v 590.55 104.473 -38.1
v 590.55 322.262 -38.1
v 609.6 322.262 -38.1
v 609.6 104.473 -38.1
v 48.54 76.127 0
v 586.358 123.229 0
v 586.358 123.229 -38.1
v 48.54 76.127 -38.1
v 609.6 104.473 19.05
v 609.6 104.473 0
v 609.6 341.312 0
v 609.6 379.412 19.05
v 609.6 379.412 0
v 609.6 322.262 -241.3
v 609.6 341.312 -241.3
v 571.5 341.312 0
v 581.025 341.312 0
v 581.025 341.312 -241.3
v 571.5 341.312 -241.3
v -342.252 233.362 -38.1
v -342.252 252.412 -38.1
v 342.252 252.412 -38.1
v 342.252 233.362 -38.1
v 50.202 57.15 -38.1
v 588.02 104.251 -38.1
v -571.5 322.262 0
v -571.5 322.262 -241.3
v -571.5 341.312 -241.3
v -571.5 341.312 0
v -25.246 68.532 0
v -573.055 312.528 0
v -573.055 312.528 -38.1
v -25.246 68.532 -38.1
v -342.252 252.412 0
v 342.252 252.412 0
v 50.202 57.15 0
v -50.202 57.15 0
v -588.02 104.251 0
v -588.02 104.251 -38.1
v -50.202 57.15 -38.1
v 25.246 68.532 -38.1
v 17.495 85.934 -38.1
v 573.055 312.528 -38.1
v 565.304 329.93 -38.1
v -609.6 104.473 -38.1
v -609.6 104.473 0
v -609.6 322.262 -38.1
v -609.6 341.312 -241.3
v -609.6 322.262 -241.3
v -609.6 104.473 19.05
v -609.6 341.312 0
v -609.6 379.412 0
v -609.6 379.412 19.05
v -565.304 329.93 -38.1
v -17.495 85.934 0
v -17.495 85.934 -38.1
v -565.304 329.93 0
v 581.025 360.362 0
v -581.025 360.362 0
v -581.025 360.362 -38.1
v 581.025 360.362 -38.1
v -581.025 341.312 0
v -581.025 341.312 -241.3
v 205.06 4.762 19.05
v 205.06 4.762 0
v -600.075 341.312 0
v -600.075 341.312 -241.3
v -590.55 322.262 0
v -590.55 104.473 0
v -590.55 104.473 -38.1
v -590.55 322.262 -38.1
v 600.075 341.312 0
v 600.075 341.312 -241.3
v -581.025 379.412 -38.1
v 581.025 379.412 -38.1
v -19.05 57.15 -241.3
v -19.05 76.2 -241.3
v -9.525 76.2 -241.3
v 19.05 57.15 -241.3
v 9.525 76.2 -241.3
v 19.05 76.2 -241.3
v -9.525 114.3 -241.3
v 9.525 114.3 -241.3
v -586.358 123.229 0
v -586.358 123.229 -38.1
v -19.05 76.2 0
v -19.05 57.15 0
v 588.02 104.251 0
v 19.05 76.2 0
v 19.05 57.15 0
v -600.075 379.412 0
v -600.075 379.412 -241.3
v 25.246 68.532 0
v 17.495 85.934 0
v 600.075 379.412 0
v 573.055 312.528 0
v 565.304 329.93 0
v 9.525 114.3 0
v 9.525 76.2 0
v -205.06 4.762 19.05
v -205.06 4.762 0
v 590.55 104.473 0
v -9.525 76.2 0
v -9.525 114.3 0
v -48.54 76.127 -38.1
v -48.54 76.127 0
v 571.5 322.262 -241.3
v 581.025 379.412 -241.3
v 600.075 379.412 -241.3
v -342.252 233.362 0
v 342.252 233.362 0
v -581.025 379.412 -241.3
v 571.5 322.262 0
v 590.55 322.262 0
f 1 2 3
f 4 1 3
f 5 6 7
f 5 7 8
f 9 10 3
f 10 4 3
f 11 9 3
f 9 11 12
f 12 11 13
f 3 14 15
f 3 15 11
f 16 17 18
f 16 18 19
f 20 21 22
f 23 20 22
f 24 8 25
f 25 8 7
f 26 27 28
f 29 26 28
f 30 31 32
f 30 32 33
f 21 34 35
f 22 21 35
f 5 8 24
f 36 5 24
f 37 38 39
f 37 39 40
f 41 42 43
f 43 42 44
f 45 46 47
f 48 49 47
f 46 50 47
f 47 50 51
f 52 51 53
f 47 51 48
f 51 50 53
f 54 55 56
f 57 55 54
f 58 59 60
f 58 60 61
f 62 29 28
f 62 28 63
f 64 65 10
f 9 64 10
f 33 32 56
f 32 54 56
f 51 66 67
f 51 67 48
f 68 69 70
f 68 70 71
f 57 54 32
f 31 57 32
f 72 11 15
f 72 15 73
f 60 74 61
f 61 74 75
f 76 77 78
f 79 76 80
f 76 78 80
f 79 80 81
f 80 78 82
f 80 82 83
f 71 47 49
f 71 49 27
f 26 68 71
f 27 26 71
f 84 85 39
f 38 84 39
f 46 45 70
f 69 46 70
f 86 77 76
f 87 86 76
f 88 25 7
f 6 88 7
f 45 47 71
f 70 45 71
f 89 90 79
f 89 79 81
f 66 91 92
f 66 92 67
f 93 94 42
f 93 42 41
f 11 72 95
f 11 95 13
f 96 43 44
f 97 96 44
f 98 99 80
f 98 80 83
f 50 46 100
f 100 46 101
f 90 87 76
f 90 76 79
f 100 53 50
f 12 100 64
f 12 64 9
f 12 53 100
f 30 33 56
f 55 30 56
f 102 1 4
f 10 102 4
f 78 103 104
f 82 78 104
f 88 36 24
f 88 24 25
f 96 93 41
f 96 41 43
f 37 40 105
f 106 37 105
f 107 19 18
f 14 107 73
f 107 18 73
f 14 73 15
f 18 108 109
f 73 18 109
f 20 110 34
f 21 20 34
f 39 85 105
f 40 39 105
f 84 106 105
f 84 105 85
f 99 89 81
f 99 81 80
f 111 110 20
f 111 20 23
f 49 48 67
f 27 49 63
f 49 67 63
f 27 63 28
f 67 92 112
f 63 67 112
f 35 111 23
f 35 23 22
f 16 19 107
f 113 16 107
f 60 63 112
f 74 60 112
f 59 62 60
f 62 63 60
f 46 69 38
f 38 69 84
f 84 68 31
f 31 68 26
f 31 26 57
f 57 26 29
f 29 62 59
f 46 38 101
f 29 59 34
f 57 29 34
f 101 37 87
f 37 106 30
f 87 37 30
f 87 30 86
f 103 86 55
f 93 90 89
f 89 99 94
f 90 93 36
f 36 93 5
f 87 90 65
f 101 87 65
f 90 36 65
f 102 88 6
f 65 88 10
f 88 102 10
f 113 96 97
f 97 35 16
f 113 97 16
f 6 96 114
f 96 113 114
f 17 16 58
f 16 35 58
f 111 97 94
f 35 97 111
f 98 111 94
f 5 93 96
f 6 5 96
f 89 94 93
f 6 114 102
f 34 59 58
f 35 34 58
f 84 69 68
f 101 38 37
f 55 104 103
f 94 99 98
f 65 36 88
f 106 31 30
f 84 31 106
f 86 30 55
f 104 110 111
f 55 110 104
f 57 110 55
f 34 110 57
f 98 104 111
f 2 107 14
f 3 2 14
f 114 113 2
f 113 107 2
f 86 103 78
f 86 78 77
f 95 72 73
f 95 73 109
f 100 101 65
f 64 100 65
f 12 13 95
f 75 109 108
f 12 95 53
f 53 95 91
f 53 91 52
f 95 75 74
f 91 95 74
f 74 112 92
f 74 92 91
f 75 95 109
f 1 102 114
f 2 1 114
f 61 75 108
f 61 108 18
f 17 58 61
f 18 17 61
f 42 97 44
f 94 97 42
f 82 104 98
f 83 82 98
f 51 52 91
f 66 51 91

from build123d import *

# Parameters (mm, degrees)
F0_W     = 684.5037638012
F0_H     = 19.05
F0_W_2   = 1162.05
F0_W_3   = 19.05
F0_H_2   = 217.7895105028
F0_H_3   = 38.1
F0_W_4   = 9.525
F1_DEPTH = 19.05
F2_DEPTH = 241.3
F3_DEPTH = 38.1


with BuildPart() as f1:
    # F0 (on Top) → F1 (new body)
    with BuildSketch(Plane.XY):
        Polygon((-205.0596728024, 4.7625), (205.0596728024, 4.7625), (609.6, 104.4729894972), (590.55, 104.4729894972), (590.55, 322.2625), (571.5, 322.2625), (571.5, 341.3125), (581.025, 341.3125), (581.025, 360.3625), (-581.025, 360.3625), (-581.025, 341.3125), (-571.5, 341.3125), (-571.5, 322.2625), (-590.55, 322.2625), (-590.55, 104.4729894972), (-609.6, 104.4729894972), align=None)
        Polygon((-586.3576715827, 123.2287481447), (-48.5401919344, 76.1273604725), (-50.202205622, 57.15), (-588.0196852703, 104.2513876722), align=None, mode=Mode.SUBTRACT)
        Polygon((-19.05, 57.15), (-19.05, 76.2), (-9.525, 76.2), (-9.525, 114.3), (9.525, 114.3), (9.525, 76.2), (19.05, 76.2), (19.05, 57.15), align=None, mode=Mode.SUBTRACT)
        Polygon((588.0196852703, 104.2513876722), (50.202205622, 57.15), (48.5401919344, 76.1273604725), (586.3576715827, 123.2287481447), align=None, mode=Mode.SUBTRACT)
        Polygon((-17.4948285758, 85.9344063425), (-25.2456829409, 68.5324881549), (-573.0551714242, 312.5280936575), (-565.3043170591, 329.9300118451), align=None, mode=Mode.SUBTRACT)
        Polygon((25.2456829409, 68.5324881549), (17.4948285758, 85.9344063425), (565.3043170591, 329.9300118451), (573.0551714242, 312.5280936575), align=None, mode=Mode.SUBTRACT)
        with Locations((0, 242.8875)):
            Rectangle(F0_W, F0_H, mode=Mode.SUBTRACT)
        with Locations((0, 369.8875)):
            Rectangle(F0_W_2, F0_H)
        with Locations((0, 242.8875)):
            Rectangle(F0_W, F0_H)
        Polygon((565.3043170591, 329.9300118451), (17.4948285758, 85.9344063425), (25.2456829409, 68.5324881549), (573.0551714242, 312.5280936575), align=None)
        Polygon((-573.0551714242, 312.5280936575), (-25.2456829409, 68.5324881549), (-17.4948285758, 85.9344063425), (-565.3043170591, 329.9300118451), align=None)
        Polygon((-50.202205622, 57.15), (-48.5401919344, 76.1273604725), (-586.3576715827, 123.2287481447), (-588.0196852703, 104.2513876722), align=None)
        Polygon((48.5401919344, 76.1273604725), (50.202205622, 57.15), (588.0196852703, 104.2513876722), (586.3576715827, 123.2287481447), align=None)
        with Locations((-600.075, 213.3677447486)):
            Rectangle(F0_W_3, F0_H_2)
        with Locations((600.075, 213.3677447486)):
            Rectangle(F0_W_3, F0_H_2)
        Polygon((590.55, 322.2625), (609.6, 322.2625), (609.6, 341.3125), (600.075, 341.3125), (581.025, 341.3125), (571.5, 341.3125), (571.5, 322.2625), align=None)
        Polygon((-9.525, 76.2), (-19.05, 76.2), (-19.05, 57.15), (19.05, 57.15), (19.05, 76.2), (9.525, 76.2), align=None)
        Polygon((-609.6, 341.3125), (-609.6, 322.2625), (-590.55, 322.2625), (-571.5, 322.2625), (-571.5, 341.3125), (-581.025, 341.3125), (-600.075, 341.3125), align=None)
        Polygon((-600.075, 379.4125), (-600.075, 341.3125), (-581.025, 341.3125), (-581.025, 360.3625), (-581.025, 379.4125), align=None)
        with Locations((0, 95.25)):
            Rectangle(F0_W_3, F0_H_3)
        Polygon((581.025, 341.3125), (600.075, 341.3125), (600.075, 379.4125), (581.025, 379.4125), (581.025, 360.3625), align=None)
        with Locations((-604.8375, 360.3625)):
            Rectangle(F0_W_4, F0_H_3)
        with Locations((604.8375, 360.3625)):
            Rectangle(F0_W_4, F0_H_3)
    extrude(amount=F1_DEPTH)

    # F0 (on Top) → F2 (join)
    with BuildSketch(Plane.XY):
        Polygon((-609.6, 341.3125), (-609.6, 322.2625), (-590.55, 322.2625), (-571.5, 322.2625), (-571.5, 341.3125), (-581.025, 341.3125), (-600.075, 341.3125), align=None)
        Polygon((-9.525, 76.2), (-19.05, 76.2), (-19.05, 57.15), (19.05, 57.15), (19.05, 76.2), (9.525, 76.2), align=None)
        Polygon((590.55, 322.2625), (609.6, 322.2625), (609.6, 341.3125), (600.075, 341.3125), (581.025, 341.3125), (571.5, 341.3125), (571.5, 322.2625), align=None)
        Polygon((581.025, 341.3125), (600.075, 341.3125), (600.075, 379.4125), (581.025, 379.4125), (581.025, 360.3625), align=None)
        with Locations((0, 95.25)):
            Rectangle(F0_W_3, F0_H_3)
        Polygon((-600.075, 379.4125), (-600.075, 341.3125), (-581.025, 341.3125), (-581.025, 360.3625), (-581.025, 379.4125), align=None)
    extrude(amount=-F2_DEPTH)

    # F0 (on Top) → F3 (join)
    with BuildSketch(Plane.XY):
        with Locations((-600.075, 213.3677447486)):
            Rectangle(F0_W_3, F0_H_2)
        Polygon((-50.202205622, 57.15), (-48.5401919344, 76.1273604725), (-586.3576715827, 123.2287481447), (-588.0196852703, 104.2513876722), align=None)
        Polygon((-573.0551714242, 312.5280936575), (-25.2456829409, 68.5324881549), (-17.4948285758, 85.9344063425), (-565.3043170591, 329.9300118451), align=None)
        with Locations((0, 369.8875)):
            Rectangle(F0_W_2, F0_H)
        Polygon((565.3043170591, 329.9300118451), (17.4948285758, 85.9344063425), (25.2456829409, 68.5324881549), (573.0551714242, 312.5280936575), align=None)
        with Locations((600.075, 213.3677447486)):
            Rectangle(F0_W_3, F0_H_2)
        Polygon((48.5401919344, 76.1273604725), (50.202205622, 57.15), (588.0196852703, 104.2513876722), (586.3576715827, 123.2287481447), align=None)
        with Locations((0, 242.8875)):
            Rectangle(F0_W, F0_H)
    extrude(amount=-F3_DEPTH)


solid = f1.part
